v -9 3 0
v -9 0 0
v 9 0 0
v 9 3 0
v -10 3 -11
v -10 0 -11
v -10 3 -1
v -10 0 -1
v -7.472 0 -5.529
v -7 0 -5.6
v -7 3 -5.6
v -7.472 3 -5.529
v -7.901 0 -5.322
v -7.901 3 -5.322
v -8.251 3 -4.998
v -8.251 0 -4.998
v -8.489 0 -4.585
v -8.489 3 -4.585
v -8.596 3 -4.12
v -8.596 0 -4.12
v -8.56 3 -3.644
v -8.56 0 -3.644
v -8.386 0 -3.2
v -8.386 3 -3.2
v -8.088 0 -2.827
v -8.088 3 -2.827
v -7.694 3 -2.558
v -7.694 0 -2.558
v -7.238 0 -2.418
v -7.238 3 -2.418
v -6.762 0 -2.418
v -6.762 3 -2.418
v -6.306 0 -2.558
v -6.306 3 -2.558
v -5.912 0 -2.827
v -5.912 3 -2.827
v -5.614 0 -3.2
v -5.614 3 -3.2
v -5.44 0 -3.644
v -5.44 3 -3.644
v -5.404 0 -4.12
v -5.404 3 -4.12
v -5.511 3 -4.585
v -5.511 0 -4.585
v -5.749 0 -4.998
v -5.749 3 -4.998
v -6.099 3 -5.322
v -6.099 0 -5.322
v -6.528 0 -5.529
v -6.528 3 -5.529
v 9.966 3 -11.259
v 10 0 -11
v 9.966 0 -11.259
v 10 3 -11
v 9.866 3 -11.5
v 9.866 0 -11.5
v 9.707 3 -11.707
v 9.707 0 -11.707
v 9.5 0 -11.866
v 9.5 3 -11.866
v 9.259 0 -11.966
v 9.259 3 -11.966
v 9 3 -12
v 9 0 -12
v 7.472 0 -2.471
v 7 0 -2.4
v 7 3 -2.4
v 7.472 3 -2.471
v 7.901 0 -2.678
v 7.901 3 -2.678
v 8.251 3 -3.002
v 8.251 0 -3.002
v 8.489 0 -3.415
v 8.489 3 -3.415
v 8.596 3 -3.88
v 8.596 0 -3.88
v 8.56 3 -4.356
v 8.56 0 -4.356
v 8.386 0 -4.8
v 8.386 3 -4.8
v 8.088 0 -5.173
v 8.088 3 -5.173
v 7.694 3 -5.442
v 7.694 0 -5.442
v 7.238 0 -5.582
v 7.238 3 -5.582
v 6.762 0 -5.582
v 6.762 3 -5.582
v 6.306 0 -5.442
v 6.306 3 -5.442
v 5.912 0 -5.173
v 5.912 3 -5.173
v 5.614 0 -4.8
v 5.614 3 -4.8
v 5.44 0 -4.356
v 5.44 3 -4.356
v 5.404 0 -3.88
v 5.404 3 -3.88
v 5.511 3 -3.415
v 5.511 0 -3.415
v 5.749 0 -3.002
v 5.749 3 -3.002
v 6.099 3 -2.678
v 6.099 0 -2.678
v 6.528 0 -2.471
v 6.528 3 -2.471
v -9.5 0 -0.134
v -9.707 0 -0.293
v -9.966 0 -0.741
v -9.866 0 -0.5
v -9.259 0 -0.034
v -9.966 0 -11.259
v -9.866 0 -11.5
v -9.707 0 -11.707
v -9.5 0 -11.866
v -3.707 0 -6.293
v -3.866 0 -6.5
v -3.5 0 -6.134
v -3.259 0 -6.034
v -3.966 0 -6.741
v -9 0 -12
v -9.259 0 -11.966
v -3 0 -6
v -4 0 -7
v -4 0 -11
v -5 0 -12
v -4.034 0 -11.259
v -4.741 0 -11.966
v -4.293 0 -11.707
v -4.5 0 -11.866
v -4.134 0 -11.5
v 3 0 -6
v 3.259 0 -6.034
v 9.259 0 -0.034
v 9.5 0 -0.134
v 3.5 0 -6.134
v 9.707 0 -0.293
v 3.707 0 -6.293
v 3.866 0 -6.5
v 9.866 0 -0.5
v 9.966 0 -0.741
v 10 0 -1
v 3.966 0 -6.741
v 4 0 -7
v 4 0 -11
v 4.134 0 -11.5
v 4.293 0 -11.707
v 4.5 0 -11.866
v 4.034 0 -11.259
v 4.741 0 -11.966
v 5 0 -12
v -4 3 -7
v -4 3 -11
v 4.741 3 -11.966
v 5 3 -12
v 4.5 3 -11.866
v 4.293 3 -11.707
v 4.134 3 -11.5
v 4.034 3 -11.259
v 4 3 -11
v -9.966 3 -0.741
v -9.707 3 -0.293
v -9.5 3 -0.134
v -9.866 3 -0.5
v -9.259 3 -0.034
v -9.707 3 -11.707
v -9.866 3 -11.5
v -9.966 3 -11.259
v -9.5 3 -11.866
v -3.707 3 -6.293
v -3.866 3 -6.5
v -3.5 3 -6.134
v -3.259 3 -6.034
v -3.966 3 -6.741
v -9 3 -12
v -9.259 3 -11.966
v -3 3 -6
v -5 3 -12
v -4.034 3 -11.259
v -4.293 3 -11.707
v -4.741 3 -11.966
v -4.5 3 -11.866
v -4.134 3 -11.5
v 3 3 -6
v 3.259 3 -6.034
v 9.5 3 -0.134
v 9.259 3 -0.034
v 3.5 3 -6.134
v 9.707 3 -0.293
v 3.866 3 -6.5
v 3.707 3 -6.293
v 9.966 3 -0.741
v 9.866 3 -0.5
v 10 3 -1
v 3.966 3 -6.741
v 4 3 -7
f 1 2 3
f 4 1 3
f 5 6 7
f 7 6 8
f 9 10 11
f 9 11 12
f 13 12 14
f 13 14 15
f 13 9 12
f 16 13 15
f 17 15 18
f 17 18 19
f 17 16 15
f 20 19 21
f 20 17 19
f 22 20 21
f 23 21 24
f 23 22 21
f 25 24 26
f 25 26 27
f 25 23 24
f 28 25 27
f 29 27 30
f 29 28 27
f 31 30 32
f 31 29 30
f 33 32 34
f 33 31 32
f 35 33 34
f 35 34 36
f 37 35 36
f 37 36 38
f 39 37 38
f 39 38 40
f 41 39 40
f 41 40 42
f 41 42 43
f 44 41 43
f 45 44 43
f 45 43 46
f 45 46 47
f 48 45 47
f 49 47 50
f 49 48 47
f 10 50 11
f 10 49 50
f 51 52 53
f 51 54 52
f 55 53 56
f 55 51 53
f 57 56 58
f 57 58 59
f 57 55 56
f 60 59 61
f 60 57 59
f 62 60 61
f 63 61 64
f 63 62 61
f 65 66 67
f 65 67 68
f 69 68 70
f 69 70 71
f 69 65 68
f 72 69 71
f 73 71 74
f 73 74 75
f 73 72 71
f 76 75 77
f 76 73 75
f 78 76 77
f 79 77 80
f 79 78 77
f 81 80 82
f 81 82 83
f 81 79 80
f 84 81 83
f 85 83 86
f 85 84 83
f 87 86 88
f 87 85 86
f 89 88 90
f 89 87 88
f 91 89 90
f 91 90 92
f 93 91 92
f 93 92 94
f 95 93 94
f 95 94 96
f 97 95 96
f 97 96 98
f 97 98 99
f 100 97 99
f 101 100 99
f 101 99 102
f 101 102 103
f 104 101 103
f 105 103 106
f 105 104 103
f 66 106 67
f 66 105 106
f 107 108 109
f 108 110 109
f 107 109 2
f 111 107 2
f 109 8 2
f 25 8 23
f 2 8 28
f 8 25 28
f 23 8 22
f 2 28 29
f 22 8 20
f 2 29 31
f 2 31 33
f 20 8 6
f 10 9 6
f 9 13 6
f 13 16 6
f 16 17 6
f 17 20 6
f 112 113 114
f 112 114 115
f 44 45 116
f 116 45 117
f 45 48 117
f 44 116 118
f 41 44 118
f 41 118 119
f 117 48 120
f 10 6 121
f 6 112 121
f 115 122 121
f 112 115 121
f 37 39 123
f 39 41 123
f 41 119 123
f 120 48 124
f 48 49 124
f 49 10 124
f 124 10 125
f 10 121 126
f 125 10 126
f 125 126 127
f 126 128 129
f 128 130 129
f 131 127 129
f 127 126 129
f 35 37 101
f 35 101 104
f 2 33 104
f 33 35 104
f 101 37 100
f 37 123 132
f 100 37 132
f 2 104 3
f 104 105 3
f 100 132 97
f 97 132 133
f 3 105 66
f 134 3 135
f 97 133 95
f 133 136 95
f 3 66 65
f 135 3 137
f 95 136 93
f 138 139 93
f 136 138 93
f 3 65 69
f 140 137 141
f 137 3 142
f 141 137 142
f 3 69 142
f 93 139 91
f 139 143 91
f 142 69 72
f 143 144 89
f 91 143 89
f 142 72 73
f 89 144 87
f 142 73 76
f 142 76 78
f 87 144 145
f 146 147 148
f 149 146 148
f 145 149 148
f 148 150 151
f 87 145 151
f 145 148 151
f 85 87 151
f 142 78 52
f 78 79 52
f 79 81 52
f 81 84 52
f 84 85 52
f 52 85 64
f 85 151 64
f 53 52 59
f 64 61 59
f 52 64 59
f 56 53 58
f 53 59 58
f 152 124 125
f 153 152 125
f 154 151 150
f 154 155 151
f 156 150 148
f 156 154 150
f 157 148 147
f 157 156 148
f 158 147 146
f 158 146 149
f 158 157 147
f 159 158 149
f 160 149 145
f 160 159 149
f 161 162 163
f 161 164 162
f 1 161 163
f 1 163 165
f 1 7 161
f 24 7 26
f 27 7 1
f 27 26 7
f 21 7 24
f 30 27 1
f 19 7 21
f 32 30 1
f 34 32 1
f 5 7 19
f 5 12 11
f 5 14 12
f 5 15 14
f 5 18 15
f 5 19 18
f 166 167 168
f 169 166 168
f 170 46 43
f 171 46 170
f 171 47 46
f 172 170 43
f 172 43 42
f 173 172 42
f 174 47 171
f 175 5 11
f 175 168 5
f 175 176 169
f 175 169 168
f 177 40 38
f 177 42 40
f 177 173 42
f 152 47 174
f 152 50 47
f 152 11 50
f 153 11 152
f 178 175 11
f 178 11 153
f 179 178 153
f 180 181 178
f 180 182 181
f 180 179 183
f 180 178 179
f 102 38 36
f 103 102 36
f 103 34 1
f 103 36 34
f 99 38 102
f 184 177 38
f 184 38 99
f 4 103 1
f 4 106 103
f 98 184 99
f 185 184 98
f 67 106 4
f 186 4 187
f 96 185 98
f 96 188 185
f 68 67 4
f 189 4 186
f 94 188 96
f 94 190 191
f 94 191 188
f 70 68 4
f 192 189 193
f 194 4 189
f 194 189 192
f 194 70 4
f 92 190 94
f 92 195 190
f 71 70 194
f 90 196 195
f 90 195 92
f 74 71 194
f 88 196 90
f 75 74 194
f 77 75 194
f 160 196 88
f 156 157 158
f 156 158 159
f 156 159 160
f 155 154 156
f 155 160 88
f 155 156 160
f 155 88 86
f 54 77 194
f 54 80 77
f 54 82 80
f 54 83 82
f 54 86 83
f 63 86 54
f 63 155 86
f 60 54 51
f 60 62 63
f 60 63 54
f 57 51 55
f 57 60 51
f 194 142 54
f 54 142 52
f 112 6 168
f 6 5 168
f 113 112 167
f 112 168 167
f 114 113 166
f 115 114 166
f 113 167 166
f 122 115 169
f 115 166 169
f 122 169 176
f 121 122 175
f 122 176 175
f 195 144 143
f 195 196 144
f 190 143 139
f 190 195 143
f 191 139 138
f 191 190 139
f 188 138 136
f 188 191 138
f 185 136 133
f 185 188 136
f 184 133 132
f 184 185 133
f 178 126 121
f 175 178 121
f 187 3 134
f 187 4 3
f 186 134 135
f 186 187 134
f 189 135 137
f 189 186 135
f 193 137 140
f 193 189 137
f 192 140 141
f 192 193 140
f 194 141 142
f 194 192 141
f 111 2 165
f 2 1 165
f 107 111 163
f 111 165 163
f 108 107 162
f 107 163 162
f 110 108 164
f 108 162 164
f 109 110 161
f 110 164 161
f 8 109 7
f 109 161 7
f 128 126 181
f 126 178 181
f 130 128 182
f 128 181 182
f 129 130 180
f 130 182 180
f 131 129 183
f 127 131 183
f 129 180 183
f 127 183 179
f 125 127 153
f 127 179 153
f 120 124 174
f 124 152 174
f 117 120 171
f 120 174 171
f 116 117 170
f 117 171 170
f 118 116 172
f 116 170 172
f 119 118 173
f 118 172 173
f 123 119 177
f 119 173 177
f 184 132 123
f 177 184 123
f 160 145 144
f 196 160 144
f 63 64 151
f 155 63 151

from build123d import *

# Parameters (mm, degrees)
SKETCH_1_R      = 1.6
EXTRUDE_1_DEPTH = 3
FILLET_1_R      = 1


with BuildPart() as part:
    # 草图1 → 凸台-拉伸1 (new body)
    with BuildSketch(Plane(origin=(0, 0, 0), x_dir=(1, 0, 0), z_dir=(0, 1, 0))):
        Polygon((-10, 0), (10, 0), (10, 12), (4, 12), (4, 6), (-4, 6), (-4, 12), (-10, 12), align=None)
        with Locations(Location((7, 4, 0), (0, 0, 270))):
            Circle(SKETCH_1_R, mode=Mode.SUBTRACT)
        with Locations(Location((-7, 4, 0), (0, 0, 90))):
            Circle(SKETCH_1_R, mode=Mode.SUBTRACT)
    extrude(amount=EXTRUDE_1_DEPTH)

    # 圆角1
    fillet_1_edges = [part.edges().sort_by_distance(p)[0] for p in [
        (-4, 1.5, -12),
        (-4, 1.5, -6),
        (4, 1.5, -6),
        (4, 1.5, -12),
        (10, 1.5, -12),
        (10, 1.5, 0),
        (-10, 1.5, 0),
        (-10, 1.5, -12),
    ]]
    fillet(fillet_1_edges, radius=FILLET_1_R)


solid = part.part
